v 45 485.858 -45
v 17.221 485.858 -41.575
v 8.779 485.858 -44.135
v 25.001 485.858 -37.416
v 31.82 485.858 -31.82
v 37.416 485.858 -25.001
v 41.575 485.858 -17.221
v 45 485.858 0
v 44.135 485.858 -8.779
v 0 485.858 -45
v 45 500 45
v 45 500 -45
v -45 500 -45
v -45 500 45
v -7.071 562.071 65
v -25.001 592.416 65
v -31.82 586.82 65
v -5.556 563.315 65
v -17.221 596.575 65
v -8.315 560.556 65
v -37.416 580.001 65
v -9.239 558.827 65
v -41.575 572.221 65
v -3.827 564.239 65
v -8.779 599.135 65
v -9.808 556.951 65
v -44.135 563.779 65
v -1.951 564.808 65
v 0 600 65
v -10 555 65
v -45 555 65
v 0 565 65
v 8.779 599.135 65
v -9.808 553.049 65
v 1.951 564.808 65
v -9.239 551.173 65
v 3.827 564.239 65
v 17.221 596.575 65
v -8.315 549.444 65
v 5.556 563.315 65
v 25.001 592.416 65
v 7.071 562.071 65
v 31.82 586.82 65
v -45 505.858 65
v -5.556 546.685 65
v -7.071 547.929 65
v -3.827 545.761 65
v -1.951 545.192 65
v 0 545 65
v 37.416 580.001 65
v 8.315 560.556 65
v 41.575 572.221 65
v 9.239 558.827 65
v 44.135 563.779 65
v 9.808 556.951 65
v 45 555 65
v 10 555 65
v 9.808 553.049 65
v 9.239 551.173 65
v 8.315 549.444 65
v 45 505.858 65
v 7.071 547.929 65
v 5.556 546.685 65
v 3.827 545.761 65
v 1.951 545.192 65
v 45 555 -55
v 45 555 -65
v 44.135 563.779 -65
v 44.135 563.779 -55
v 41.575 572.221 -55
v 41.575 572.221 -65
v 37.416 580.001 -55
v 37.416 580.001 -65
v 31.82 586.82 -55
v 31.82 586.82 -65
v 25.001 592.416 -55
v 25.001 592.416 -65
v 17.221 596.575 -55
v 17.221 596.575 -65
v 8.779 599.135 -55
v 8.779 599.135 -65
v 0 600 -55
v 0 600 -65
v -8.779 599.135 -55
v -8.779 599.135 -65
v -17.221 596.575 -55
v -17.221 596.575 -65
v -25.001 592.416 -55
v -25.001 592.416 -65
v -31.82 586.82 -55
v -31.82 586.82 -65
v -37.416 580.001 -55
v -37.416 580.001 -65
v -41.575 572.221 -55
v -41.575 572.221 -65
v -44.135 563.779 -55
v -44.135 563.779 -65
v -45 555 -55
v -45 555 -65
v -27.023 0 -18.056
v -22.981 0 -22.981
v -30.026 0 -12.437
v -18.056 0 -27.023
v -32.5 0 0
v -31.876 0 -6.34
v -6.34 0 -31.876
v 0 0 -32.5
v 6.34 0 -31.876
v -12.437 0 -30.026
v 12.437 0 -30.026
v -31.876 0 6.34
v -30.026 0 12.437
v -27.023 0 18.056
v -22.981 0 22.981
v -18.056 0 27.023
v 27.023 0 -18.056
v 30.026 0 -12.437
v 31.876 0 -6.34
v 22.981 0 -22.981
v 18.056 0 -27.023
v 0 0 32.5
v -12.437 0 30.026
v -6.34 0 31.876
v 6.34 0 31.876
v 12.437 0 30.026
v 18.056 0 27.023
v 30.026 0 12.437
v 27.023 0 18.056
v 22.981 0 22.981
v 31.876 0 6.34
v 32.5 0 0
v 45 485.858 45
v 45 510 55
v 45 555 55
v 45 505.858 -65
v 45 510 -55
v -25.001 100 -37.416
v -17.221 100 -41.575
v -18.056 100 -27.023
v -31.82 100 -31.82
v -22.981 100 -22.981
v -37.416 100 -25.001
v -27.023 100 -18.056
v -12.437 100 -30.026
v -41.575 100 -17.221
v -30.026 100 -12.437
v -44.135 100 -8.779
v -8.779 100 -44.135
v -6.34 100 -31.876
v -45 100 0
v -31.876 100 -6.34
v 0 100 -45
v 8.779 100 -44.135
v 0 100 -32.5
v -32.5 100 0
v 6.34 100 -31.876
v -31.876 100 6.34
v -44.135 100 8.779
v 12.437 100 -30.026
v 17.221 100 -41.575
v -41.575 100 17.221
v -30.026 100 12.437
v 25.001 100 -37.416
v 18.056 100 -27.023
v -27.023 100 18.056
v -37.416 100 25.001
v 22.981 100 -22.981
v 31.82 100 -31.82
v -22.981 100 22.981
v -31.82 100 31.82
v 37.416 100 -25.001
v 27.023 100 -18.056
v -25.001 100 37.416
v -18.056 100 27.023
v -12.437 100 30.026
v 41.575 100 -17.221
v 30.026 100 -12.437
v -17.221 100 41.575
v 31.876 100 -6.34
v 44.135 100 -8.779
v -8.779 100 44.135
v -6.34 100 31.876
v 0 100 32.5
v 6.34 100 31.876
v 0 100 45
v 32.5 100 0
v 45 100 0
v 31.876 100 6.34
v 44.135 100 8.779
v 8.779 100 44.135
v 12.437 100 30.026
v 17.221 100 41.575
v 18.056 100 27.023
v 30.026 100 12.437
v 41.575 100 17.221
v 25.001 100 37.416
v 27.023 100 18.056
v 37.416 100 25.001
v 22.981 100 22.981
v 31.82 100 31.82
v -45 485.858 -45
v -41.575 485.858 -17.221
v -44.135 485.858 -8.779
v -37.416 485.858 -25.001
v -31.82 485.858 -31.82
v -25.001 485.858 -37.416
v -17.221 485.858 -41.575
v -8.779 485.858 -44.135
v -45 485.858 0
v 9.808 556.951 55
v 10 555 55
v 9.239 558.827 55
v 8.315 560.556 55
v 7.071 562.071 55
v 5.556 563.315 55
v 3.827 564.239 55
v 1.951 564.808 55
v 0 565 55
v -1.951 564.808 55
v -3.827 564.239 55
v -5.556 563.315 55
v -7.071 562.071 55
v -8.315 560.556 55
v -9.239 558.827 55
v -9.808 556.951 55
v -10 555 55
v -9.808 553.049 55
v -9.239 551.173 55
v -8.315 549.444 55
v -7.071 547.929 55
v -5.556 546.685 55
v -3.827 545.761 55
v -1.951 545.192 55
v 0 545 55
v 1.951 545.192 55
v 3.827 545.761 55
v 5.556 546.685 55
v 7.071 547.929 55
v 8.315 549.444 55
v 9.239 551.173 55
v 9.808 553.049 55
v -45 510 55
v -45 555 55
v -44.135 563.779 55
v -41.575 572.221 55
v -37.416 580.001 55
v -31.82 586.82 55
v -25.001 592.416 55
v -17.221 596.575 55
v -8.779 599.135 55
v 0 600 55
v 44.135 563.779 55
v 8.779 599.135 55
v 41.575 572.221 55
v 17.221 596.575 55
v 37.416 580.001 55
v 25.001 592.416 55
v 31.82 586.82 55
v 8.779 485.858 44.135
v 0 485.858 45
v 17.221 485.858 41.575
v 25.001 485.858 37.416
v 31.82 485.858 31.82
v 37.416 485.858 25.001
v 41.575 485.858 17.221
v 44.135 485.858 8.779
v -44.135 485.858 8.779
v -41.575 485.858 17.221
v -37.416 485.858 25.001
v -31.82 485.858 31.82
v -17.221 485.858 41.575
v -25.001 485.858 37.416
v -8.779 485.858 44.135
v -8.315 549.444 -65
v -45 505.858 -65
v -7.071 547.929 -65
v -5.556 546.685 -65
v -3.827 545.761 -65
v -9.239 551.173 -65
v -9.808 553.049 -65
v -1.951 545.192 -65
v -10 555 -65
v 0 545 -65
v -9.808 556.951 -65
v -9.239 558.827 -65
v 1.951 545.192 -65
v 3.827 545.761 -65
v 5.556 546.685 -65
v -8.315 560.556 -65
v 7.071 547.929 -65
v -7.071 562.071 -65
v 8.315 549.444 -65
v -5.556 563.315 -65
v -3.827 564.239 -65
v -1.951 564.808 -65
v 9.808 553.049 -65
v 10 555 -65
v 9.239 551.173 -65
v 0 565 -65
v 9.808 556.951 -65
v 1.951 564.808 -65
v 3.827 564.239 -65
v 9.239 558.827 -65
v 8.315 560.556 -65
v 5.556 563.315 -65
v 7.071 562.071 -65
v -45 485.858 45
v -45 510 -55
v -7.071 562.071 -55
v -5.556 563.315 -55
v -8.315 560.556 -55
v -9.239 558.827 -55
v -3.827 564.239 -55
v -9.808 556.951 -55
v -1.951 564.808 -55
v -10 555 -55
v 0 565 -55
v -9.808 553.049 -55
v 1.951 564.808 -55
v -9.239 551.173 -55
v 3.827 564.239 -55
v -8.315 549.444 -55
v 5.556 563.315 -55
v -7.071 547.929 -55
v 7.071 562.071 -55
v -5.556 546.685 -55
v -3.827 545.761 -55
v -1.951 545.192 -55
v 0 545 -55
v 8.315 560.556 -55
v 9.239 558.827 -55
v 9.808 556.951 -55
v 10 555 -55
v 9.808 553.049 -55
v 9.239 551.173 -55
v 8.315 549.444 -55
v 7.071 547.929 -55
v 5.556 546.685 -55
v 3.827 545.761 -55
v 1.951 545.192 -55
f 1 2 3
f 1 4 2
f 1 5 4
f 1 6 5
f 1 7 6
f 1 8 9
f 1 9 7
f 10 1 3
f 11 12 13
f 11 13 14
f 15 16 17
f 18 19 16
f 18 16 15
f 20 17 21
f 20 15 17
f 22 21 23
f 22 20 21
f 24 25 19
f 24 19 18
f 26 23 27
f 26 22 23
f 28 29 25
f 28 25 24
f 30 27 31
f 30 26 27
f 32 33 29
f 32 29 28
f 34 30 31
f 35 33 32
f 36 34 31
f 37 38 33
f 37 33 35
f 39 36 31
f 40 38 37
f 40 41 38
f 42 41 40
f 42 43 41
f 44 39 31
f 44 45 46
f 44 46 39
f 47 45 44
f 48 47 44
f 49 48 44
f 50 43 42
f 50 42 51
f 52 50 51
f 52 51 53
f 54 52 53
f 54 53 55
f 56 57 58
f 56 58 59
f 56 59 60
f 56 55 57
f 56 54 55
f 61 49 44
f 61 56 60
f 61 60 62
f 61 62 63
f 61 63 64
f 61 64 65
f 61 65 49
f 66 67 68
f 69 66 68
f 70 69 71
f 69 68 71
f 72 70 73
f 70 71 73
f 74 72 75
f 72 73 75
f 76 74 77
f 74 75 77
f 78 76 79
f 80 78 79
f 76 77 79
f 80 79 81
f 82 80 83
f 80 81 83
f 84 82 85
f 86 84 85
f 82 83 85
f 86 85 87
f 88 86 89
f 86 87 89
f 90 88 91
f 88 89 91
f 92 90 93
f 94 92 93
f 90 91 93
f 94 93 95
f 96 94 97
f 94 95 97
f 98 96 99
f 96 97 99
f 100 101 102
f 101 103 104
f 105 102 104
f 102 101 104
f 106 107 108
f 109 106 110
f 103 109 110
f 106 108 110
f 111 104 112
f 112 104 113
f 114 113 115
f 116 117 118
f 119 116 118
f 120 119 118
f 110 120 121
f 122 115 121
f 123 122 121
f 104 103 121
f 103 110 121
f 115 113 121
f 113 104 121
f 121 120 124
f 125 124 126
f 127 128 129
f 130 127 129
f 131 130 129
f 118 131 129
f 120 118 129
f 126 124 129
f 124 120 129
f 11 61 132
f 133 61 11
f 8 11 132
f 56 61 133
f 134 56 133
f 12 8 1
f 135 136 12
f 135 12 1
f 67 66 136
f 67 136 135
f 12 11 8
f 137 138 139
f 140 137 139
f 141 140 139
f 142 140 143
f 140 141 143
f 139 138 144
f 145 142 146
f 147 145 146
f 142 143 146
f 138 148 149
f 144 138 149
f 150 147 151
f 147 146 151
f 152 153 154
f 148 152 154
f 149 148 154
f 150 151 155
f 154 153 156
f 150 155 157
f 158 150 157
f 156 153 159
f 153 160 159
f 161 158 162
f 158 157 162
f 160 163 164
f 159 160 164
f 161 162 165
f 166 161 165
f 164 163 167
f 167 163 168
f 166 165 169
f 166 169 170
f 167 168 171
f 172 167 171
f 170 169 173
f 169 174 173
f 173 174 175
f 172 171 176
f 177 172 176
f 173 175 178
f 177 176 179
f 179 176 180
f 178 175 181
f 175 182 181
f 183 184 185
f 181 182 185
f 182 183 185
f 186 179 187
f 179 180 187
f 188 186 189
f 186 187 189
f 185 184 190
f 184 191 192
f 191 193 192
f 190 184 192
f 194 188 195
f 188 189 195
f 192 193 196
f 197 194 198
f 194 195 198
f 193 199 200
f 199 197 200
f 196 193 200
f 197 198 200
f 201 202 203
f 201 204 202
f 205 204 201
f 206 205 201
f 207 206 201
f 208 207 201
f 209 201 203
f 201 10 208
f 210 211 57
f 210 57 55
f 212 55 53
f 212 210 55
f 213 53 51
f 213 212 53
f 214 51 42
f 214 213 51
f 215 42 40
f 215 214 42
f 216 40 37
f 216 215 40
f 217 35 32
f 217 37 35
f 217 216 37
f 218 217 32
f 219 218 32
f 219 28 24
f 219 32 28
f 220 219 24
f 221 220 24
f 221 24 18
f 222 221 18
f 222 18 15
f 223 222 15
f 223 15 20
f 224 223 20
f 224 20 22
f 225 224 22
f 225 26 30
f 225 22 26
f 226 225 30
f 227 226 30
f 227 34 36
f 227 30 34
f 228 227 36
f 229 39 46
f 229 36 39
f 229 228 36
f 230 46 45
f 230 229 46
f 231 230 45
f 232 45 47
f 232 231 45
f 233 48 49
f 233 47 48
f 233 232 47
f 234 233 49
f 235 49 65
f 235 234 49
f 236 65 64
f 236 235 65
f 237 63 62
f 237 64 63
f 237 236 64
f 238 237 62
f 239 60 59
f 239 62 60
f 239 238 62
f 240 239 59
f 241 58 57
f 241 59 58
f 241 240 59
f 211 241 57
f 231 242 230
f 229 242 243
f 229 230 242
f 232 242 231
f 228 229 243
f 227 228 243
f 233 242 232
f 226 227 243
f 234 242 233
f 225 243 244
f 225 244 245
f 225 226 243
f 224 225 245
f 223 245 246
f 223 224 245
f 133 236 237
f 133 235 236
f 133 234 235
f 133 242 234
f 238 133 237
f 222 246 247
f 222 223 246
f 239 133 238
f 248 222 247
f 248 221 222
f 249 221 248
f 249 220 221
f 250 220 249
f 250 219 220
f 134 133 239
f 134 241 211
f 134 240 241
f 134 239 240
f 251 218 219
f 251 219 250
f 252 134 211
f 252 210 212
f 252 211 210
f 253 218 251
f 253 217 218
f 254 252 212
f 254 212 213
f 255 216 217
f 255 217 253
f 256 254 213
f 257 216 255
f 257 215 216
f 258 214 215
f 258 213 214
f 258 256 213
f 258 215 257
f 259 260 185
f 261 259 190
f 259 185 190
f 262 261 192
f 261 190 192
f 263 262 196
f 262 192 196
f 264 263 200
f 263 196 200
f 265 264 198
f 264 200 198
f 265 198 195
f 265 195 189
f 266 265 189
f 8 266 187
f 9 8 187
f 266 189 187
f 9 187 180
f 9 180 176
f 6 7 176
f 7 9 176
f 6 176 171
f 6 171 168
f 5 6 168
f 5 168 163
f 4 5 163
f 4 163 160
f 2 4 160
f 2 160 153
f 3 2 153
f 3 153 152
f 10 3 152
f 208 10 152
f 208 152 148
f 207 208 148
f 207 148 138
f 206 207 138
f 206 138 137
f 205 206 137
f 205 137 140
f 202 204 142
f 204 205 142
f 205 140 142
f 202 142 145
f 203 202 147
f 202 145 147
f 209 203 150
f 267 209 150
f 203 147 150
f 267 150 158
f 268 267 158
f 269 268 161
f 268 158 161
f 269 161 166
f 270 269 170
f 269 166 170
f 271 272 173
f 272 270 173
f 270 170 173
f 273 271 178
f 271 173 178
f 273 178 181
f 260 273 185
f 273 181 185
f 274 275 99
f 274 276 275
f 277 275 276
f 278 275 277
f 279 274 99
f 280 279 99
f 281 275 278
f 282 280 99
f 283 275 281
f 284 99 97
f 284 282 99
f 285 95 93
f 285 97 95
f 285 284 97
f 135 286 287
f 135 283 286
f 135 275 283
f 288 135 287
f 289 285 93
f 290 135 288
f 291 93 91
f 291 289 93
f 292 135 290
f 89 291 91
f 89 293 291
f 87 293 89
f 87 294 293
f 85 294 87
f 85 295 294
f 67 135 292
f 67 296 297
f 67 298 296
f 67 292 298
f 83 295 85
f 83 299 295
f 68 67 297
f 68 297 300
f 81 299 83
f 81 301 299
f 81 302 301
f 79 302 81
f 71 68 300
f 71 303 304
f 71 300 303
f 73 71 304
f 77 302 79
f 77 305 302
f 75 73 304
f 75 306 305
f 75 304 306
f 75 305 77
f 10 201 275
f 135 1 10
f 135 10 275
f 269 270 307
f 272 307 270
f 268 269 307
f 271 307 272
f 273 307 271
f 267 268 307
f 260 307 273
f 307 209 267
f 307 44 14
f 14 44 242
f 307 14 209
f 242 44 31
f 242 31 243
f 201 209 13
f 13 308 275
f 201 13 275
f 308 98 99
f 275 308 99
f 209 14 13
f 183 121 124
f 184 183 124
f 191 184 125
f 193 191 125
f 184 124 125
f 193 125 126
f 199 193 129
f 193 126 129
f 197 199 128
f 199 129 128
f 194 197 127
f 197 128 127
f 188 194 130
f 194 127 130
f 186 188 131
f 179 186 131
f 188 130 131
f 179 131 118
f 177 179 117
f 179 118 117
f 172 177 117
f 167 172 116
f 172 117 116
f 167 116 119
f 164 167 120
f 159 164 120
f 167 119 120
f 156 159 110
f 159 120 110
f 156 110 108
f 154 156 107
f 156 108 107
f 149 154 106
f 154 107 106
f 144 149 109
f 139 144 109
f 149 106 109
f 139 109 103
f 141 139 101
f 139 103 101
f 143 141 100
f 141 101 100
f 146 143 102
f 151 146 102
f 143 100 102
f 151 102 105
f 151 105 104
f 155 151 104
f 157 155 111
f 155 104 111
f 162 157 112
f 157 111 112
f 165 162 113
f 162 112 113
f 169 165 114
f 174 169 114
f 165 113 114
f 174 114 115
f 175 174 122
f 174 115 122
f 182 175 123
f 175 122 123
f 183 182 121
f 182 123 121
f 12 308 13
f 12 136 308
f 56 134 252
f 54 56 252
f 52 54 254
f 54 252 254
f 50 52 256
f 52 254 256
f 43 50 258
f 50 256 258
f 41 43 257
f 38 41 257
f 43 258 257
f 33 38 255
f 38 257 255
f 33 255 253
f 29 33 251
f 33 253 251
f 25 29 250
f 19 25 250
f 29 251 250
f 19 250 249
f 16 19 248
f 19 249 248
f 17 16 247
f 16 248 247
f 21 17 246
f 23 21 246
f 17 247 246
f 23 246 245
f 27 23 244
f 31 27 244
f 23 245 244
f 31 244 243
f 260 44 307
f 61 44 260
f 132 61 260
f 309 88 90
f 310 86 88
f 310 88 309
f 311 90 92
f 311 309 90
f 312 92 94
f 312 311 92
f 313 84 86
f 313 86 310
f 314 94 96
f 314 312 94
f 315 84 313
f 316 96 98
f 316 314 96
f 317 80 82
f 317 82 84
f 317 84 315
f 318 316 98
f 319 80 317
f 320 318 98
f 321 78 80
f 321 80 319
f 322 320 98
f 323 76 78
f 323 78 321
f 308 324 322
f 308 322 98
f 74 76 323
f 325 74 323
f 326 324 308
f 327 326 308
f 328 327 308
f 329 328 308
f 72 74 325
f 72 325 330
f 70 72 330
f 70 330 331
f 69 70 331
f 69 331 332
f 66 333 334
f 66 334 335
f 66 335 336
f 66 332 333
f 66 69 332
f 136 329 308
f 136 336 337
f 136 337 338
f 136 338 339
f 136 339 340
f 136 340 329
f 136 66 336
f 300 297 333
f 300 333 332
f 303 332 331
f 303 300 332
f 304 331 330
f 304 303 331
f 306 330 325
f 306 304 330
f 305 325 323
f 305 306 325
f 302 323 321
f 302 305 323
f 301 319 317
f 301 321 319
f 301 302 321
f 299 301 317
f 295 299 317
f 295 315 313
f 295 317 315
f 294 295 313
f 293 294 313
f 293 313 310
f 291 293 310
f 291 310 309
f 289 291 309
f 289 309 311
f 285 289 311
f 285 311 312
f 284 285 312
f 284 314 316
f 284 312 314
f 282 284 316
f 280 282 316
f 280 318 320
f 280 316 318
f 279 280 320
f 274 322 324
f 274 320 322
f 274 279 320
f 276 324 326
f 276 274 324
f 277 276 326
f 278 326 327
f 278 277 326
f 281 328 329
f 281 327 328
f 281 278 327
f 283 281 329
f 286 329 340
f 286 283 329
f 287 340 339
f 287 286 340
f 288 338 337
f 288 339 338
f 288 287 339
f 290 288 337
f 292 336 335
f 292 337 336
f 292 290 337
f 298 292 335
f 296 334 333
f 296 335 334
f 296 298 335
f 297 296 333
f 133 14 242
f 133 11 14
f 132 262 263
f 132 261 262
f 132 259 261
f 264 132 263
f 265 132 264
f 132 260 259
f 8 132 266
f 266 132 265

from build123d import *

# Parameters (mm, degrees)
SKETCH1_R               = 32.5
BOSS_EXTRUDE1_DEPTH     = 100
SKETCH2_R               = 45
BOSS_EXTRUDE2_DEPTH     = 400
BOSS_EXTRUDE3_DEPTH     = 45
CUT_EXTRUDE2_DEPTH      = 616.568842616
CUT_EXTRUDE2_DEPTH_BACK = 616.568842616
SKETCH7_R               = 10


with BuildPart() as part:
    # Sketch1 → Boss-Extrude1 (new body)
    with BuildSketch(Plane(origin=(0, 0, 0), x_dir=(1, 0, 0), z_dir=(0, 1, 0))):
        with Locations(Location((0, 0, 0), (0, 0, 270))):
            Circle(SKETCH1_R)
    extrude(amount=BOSS_EXTRUDE1_DEPTH)

    # Sketch2 → Boss-Extrude2 (add)
    with BuildSketch(Plane(origin=(0, 100, 0), x_dir=(1, 0, 0), z_dir=(0, 1, 0))):
        with Locations(Location((0, 0, 0), (0, 0, 270))):
            Circle(SKETCH2_R)
    extrude(amount=BOSS_EXTRUDE2_DEPTH)

    # Sketch6 → Boss-Extrude3 (add, symmetric)
    with BuildSketch(Plane(origin=(0, 0, 0), x_dir=(0, 0, -1), z_dir=(1, 0, 0))):
        Polygon((-45, 500), (-55, 510), (-55, 600), (-65, 600), (-65, 505.857864376), (-45, 485.857864376), (45, 485.857864376), (65, 505.857864376), (65, 600), (55, 600), (55, 510), (45, 500), align=None)
    extrude(amount=BOSS_EXTRUDE3_DEPTH, both=True)

    # Sketch7 → Cut-Extrude2 (cut, two sides: drawn at the far end of the back side and taken through both)
    with BuildSketch(Plane.XY.offset(65).offset(-CUT_EXTRUDE2_DEPTH_BACK)):
        with Locations((0, 555)):
            Circle(SKETCH7_R)
        with BuildLine():
            Line((-45, 555), (-45, 605))
            Line((-45, 605), (45, 605))
            Line((45, 605), (45, 555))
            ThreePointArc((45, 555), (0, 600), (-45, 555))
        make_face()
    extrude(amount=CUT_EXTRUDE2_DEPTH + CUT_EXTRUDE2_DEPTH_BACK, mode=Mode.SUBTRACT)


solid = part.part
